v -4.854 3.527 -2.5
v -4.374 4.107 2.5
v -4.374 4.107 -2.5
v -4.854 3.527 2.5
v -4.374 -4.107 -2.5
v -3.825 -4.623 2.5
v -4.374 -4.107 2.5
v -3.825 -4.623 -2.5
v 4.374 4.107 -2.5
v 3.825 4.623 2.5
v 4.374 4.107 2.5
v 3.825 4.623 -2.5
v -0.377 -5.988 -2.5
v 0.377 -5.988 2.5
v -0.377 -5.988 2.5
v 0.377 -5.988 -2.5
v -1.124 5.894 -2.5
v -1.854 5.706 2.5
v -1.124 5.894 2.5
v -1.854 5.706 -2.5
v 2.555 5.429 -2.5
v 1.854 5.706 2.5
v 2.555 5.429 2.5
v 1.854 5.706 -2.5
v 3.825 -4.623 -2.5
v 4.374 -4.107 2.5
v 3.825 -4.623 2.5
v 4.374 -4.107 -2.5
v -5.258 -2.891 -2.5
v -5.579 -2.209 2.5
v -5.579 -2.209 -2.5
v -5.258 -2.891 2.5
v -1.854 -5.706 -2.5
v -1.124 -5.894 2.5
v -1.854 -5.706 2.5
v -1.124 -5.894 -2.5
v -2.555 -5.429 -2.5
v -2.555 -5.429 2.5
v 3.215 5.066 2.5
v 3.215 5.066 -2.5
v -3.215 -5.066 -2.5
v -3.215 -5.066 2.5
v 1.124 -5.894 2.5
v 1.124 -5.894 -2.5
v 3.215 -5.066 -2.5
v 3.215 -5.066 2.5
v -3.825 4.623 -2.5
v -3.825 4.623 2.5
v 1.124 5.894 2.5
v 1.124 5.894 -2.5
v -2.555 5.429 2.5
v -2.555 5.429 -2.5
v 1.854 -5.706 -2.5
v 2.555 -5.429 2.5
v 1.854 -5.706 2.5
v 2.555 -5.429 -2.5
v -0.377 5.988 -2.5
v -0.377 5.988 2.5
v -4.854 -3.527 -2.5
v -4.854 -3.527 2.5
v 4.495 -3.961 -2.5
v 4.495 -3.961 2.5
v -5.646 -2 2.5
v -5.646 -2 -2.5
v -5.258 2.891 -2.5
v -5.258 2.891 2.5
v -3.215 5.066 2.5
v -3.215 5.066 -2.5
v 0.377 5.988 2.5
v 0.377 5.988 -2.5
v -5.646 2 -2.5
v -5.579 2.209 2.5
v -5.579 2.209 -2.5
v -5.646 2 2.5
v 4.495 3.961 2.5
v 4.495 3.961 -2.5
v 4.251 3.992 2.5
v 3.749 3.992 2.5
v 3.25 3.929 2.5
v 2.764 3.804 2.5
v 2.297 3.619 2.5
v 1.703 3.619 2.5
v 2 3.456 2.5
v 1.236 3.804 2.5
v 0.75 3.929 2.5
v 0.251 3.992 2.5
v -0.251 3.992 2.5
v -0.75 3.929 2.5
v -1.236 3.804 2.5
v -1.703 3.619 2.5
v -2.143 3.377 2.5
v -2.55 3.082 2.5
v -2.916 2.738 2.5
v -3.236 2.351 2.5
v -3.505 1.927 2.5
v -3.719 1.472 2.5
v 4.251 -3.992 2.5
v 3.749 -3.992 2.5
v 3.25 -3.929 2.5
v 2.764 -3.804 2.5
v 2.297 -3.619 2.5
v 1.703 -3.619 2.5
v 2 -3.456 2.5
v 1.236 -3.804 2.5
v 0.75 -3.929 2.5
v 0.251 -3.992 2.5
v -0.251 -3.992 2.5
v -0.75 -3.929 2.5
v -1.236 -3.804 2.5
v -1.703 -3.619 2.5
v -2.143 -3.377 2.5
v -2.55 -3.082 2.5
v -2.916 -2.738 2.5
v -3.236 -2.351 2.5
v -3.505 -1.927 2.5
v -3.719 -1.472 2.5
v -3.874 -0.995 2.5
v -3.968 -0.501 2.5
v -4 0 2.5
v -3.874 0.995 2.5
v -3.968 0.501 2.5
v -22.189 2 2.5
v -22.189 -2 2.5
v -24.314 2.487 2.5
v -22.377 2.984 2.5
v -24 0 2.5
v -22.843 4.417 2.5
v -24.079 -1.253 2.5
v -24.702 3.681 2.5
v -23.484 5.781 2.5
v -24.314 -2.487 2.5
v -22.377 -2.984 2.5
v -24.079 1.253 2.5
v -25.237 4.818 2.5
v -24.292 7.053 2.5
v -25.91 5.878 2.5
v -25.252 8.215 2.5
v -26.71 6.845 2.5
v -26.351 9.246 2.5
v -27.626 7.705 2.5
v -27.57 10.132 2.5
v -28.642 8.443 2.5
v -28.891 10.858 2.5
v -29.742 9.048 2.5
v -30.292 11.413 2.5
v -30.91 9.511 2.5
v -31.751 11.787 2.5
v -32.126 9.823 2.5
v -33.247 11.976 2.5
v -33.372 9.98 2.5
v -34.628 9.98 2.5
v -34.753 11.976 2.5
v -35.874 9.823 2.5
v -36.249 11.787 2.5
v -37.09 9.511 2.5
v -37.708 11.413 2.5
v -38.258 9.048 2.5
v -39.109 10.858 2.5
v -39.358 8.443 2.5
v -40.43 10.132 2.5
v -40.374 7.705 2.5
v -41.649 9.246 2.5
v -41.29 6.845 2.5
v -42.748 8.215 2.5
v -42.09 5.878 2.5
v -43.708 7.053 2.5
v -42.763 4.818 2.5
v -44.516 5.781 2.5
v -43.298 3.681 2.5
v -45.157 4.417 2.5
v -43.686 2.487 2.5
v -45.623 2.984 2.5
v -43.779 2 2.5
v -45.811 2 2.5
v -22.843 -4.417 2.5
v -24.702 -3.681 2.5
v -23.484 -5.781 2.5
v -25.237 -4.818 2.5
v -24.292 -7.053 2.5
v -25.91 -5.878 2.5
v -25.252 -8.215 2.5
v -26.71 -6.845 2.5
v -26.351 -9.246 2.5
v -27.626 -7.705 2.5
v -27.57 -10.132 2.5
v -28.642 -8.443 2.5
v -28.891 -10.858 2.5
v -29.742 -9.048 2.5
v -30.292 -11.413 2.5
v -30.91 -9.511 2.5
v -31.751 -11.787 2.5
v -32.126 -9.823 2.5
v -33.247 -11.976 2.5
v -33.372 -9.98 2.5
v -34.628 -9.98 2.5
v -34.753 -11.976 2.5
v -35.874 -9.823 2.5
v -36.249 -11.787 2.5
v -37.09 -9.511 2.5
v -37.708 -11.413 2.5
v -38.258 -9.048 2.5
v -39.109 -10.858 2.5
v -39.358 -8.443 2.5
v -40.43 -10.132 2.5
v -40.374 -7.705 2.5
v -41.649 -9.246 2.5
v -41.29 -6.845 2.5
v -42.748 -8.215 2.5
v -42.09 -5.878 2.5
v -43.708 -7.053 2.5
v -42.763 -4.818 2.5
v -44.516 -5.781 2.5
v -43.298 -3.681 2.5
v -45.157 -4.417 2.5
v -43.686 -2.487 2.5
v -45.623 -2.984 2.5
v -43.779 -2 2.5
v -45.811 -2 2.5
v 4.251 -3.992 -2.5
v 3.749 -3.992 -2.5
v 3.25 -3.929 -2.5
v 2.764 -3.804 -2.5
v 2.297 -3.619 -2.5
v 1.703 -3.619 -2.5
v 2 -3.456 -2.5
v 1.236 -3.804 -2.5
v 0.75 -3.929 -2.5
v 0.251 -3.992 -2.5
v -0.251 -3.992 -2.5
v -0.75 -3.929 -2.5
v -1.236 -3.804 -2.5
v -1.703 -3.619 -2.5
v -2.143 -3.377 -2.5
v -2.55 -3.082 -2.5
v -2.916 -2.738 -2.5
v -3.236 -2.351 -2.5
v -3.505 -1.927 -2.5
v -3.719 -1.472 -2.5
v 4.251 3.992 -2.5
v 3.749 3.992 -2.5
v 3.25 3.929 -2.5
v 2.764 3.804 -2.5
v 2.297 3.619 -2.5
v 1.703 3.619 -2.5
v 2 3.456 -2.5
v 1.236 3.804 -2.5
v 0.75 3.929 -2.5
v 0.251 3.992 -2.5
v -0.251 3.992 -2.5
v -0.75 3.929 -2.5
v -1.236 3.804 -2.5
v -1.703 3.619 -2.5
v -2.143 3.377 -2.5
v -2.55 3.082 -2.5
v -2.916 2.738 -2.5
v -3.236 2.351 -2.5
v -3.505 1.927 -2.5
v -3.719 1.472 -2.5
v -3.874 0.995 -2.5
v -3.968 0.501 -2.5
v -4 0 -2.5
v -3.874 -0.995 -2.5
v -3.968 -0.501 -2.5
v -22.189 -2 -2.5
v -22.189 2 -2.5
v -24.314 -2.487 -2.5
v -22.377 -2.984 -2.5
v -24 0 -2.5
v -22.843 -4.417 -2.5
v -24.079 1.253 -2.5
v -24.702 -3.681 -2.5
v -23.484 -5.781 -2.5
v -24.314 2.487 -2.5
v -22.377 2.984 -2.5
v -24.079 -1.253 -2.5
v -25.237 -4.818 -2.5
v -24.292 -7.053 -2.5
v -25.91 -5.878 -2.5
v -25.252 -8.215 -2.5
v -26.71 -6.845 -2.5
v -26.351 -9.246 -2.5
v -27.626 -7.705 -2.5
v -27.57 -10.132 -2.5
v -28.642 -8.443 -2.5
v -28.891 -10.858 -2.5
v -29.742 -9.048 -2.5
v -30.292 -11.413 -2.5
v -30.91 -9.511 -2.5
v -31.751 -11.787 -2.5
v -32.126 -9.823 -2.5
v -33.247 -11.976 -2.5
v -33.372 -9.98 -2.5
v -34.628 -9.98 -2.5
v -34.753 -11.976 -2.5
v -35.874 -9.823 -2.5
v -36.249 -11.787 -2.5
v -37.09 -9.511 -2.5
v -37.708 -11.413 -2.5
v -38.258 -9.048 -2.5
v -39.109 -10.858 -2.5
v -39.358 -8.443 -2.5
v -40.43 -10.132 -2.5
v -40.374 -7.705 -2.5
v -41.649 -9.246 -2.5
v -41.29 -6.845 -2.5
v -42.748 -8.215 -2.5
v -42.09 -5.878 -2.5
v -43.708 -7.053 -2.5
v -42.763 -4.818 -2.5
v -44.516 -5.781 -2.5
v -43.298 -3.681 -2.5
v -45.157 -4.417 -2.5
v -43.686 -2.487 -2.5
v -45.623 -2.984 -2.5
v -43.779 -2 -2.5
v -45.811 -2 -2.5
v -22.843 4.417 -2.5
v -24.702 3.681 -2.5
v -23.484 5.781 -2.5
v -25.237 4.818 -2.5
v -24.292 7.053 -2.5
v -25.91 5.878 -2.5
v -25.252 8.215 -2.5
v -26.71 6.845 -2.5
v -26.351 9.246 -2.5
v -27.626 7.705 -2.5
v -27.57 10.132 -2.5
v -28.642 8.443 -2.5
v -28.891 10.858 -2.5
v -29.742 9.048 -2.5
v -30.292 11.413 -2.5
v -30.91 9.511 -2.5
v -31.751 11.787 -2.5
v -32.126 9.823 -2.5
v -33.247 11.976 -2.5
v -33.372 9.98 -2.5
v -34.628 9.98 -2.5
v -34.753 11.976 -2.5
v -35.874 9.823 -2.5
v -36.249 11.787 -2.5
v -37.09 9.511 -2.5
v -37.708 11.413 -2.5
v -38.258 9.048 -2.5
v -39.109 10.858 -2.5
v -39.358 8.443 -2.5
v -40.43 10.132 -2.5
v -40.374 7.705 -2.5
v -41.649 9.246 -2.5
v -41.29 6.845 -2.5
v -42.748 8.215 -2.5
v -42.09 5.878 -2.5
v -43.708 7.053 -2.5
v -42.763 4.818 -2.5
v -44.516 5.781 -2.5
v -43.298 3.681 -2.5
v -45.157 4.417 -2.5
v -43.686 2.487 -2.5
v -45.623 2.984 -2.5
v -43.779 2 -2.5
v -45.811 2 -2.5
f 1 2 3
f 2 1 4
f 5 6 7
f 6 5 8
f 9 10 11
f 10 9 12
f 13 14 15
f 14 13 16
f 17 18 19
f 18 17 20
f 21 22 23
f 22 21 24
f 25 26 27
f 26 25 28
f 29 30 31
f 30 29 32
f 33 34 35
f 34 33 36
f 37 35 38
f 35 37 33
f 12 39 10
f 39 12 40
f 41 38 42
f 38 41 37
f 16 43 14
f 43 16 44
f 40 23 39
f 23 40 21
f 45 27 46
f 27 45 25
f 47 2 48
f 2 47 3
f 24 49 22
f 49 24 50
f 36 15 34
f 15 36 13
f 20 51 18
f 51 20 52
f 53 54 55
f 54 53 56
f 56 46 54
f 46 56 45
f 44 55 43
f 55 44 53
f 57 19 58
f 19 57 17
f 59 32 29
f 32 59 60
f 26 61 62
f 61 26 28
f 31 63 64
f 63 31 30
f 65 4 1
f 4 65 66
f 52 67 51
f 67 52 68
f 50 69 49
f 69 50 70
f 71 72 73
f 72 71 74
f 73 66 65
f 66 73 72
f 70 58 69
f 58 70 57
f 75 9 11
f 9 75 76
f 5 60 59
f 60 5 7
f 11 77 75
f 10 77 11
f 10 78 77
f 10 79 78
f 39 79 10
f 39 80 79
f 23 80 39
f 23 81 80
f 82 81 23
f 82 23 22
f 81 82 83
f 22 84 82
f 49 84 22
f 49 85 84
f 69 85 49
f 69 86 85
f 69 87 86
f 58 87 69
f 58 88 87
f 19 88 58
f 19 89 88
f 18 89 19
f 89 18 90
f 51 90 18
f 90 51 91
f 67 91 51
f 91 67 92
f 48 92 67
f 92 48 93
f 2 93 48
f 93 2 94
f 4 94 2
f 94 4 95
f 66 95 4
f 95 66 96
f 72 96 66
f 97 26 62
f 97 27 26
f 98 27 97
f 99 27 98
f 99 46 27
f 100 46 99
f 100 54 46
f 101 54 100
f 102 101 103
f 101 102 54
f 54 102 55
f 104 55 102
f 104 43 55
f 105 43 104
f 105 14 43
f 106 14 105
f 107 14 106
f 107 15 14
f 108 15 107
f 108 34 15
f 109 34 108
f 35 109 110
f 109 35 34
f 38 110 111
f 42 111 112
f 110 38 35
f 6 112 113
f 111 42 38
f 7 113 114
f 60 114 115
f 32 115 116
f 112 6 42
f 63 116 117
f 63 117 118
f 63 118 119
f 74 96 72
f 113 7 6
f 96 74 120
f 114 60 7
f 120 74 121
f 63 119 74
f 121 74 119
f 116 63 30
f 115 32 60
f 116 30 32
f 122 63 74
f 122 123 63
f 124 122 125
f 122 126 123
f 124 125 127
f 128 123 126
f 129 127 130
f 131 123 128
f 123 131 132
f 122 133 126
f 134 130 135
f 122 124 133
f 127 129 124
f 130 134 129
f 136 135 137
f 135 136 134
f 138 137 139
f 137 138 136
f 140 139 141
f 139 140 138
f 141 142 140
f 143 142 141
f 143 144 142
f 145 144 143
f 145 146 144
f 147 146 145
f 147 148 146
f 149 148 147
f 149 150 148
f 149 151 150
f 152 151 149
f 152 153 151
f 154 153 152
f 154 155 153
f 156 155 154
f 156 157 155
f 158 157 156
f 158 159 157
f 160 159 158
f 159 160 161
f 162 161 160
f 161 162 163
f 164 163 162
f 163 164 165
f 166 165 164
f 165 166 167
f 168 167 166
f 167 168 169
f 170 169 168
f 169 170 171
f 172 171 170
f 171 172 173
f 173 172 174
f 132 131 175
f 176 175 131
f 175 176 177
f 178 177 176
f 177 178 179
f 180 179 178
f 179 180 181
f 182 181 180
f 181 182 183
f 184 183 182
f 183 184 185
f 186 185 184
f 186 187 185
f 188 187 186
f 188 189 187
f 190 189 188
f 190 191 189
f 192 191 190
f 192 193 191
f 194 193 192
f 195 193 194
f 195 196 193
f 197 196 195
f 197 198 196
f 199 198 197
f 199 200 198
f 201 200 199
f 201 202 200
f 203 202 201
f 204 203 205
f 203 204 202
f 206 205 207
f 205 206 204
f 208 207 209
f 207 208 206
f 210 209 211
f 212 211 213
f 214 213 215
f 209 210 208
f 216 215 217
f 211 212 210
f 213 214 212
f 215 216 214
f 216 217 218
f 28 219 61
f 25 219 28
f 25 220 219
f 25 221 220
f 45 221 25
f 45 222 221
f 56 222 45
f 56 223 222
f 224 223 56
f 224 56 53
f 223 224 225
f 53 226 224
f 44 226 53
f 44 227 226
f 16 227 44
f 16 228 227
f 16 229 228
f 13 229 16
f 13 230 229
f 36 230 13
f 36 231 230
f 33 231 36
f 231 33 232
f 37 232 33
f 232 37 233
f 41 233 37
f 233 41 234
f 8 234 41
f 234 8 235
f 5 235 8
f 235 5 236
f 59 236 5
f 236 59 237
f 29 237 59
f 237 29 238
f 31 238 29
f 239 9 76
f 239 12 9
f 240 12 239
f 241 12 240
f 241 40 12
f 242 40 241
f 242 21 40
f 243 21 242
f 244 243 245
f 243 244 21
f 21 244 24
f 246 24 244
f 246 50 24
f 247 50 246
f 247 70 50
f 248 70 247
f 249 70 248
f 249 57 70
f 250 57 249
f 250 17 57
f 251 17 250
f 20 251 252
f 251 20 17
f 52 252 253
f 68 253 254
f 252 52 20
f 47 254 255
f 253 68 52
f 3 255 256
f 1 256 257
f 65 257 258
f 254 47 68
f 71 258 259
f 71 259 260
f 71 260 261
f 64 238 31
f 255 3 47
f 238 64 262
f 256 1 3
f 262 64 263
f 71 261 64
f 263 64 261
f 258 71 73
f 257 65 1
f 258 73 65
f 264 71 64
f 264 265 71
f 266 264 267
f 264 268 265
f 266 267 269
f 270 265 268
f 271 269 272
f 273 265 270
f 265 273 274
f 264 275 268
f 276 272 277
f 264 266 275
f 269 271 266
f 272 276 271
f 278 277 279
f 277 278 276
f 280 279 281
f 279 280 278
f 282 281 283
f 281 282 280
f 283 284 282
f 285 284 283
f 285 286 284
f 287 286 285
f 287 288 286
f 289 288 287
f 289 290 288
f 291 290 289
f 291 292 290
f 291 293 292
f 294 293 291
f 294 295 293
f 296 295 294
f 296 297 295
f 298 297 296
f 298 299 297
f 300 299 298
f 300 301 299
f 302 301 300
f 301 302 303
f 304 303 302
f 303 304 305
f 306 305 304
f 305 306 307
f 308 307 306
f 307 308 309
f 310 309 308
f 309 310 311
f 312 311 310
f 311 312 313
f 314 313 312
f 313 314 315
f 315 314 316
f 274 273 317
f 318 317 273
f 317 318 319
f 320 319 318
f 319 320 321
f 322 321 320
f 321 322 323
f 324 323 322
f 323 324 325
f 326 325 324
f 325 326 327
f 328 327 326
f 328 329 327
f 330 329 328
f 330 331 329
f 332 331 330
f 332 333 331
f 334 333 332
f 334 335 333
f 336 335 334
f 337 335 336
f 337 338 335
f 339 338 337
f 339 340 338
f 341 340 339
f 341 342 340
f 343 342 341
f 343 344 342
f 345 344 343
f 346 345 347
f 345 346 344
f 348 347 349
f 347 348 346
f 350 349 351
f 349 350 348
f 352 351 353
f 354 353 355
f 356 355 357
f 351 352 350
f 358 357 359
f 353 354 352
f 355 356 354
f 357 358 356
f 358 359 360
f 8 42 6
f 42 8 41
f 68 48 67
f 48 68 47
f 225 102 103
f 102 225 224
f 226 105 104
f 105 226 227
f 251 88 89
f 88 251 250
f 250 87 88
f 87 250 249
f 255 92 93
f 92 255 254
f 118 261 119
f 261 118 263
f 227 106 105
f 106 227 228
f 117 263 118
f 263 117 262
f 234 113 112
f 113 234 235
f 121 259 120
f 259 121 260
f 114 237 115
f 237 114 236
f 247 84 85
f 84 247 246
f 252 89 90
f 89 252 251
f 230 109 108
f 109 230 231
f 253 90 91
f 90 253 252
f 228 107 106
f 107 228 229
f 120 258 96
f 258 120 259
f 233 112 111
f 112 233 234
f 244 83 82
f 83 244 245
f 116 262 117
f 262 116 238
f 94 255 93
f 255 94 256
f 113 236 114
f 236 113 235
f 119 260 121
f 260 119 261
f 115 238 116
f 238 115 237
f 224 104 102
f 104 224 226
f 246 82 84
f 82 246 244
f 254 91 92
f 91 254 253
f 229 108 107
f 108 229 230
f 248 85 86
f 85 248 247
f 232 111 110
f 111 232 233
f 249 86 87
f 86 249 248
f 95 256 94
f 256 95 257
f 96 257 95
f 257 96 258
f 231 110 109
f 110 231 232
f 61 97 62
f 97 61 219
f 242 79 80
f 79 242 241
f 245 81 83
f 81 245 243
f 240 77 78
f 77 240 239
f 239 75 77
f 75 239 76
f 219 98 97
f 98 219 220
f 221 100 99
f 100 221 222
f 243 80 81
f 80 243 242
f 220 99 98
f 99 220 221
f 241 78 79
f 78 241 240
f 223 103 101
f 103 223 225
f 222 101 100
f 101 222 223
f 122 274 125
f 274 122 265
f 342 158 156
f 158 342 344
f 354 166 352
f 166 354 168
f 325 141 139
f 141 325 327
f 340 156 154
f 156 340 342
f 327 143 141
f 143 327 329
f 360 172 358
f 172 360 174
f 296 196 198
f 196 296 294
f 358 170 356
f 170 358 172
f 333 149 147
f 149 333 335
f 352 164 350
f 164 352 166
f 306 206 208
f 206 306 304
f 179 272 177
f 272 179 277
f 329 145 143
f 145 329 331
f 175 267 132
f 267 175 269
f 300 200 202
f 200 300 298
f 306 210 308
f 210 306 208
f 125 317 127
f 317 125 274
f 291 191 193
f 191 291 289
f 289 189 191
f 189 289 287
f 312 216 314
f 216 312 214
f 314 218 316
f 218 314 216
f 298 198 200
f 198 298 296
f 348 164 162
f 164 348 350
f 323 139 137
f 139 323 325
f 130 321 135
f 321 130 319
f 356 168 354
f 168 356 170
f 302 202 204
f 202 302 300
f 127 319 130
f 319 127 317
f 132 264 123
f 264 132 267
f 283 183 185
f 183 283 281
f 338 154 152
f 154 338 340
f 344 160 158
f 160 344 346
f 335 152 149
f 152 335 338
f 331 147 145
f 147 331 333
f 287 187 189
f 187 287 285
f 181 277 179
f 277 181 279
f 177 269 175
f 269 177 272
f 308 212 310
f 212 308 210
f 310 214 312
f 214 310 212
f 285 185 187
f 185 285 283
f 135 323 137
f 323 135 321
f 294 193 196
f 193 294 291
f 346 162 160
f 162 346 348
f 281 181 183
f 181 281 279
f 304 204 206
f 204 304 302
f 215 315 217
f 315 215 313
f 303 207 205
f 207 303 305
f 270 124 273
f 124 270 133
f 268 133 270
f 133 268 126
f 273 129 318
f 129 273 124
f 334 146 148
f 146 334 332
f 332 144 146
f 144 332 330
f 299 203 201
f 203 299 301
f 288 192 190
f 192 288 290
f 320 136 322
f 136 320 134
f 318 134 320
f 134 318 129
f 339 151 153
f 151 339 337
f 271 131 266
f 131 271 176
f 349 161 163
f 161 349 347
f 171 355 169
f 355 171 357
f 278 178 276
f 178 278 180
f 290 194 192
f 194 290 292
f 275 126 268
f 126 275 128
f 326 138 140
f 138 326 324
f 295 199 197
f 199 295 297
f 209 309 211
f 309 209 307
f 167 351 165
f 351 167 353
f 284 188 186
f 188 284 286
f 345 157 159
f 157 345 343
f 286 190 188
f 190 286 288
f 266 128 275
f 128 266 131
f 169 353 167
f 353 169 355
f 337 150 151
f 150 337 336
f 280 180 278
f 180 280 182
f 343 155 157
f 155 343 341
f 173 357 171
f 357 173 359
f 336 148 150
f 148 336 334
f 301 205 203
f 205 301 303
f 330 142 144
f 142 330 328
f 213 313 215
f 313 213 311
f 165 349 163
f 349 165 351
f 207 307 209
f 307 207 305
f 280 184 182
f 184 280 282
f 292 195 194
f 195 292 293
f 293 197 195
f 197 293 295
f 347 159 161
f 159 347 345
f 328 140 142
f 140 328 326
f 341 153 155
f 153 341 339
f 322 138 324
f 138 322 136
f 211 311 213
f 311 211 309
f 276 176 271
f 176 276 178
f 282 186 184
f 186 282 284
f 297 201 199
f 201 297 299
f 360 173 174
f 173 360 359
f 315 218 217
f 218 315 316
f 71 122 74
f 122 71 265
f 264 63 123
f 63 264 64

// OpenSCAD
// Tutor diameter
TUTOR_DIAMETER = 8; // [4:30]
// Thickness of the cylinders 
HOOK_THICKNESS = 2; // [1:10]
// Thickness of the hook
THICKNESS = 5; // [2:20]
// Length of the neck between the two hooks
TUTOR_LENGTH = 20; // [1:100]
// Width of the neck
TUTOR_WIDTH = 4; // [1:20]
// Plant hook diameter
HOOK_DIAMETER = 20; // [10:100]
// Opened space to insert the plant inside the hook
HOOK_SPACING = 4; // [2:20]

$fn = 50;
difference() {
    cylinder(h = THICKNESS, d = TUTOR_DIAMETER + 2 * HOOK_THICKNESS, center = true);
    cylinder(h = THICKNESS, d = TUTOR_DIAMETER, center = true);
    translate([TUTOR_DIAMETER/2, 0, 0]) cylinder(h = THICKNESS, d = TUTOR_DIAMETER, center = true);
}
translate([-(TUTOR_LENGTH/2 + TUTOR_DIAMETER/2), 0, 0]) cube([TUTOR_LENGTH, TUTOR_WIDTH, THICKNESS], center = true);

translate([-(TUTOR_LENGTH + TUTOR_DIAMETER/2 + HOOK_DIAMETER / 2), 0, 0])  
difference() {
    cylinder(h = THICKNESS, d = HOOK_DIAMETER + 2 * HOOK_THICKNESS, center = true);
    cylinder(h = THICKNESS, d = HOOK_DIAMETER, center = true);
    color("green") translate([-(HOOK_DIAMETER / 2), 0, 0]) cube([THICKNESS, HOOK_SPACING, THICKNESS], center = true);
}
